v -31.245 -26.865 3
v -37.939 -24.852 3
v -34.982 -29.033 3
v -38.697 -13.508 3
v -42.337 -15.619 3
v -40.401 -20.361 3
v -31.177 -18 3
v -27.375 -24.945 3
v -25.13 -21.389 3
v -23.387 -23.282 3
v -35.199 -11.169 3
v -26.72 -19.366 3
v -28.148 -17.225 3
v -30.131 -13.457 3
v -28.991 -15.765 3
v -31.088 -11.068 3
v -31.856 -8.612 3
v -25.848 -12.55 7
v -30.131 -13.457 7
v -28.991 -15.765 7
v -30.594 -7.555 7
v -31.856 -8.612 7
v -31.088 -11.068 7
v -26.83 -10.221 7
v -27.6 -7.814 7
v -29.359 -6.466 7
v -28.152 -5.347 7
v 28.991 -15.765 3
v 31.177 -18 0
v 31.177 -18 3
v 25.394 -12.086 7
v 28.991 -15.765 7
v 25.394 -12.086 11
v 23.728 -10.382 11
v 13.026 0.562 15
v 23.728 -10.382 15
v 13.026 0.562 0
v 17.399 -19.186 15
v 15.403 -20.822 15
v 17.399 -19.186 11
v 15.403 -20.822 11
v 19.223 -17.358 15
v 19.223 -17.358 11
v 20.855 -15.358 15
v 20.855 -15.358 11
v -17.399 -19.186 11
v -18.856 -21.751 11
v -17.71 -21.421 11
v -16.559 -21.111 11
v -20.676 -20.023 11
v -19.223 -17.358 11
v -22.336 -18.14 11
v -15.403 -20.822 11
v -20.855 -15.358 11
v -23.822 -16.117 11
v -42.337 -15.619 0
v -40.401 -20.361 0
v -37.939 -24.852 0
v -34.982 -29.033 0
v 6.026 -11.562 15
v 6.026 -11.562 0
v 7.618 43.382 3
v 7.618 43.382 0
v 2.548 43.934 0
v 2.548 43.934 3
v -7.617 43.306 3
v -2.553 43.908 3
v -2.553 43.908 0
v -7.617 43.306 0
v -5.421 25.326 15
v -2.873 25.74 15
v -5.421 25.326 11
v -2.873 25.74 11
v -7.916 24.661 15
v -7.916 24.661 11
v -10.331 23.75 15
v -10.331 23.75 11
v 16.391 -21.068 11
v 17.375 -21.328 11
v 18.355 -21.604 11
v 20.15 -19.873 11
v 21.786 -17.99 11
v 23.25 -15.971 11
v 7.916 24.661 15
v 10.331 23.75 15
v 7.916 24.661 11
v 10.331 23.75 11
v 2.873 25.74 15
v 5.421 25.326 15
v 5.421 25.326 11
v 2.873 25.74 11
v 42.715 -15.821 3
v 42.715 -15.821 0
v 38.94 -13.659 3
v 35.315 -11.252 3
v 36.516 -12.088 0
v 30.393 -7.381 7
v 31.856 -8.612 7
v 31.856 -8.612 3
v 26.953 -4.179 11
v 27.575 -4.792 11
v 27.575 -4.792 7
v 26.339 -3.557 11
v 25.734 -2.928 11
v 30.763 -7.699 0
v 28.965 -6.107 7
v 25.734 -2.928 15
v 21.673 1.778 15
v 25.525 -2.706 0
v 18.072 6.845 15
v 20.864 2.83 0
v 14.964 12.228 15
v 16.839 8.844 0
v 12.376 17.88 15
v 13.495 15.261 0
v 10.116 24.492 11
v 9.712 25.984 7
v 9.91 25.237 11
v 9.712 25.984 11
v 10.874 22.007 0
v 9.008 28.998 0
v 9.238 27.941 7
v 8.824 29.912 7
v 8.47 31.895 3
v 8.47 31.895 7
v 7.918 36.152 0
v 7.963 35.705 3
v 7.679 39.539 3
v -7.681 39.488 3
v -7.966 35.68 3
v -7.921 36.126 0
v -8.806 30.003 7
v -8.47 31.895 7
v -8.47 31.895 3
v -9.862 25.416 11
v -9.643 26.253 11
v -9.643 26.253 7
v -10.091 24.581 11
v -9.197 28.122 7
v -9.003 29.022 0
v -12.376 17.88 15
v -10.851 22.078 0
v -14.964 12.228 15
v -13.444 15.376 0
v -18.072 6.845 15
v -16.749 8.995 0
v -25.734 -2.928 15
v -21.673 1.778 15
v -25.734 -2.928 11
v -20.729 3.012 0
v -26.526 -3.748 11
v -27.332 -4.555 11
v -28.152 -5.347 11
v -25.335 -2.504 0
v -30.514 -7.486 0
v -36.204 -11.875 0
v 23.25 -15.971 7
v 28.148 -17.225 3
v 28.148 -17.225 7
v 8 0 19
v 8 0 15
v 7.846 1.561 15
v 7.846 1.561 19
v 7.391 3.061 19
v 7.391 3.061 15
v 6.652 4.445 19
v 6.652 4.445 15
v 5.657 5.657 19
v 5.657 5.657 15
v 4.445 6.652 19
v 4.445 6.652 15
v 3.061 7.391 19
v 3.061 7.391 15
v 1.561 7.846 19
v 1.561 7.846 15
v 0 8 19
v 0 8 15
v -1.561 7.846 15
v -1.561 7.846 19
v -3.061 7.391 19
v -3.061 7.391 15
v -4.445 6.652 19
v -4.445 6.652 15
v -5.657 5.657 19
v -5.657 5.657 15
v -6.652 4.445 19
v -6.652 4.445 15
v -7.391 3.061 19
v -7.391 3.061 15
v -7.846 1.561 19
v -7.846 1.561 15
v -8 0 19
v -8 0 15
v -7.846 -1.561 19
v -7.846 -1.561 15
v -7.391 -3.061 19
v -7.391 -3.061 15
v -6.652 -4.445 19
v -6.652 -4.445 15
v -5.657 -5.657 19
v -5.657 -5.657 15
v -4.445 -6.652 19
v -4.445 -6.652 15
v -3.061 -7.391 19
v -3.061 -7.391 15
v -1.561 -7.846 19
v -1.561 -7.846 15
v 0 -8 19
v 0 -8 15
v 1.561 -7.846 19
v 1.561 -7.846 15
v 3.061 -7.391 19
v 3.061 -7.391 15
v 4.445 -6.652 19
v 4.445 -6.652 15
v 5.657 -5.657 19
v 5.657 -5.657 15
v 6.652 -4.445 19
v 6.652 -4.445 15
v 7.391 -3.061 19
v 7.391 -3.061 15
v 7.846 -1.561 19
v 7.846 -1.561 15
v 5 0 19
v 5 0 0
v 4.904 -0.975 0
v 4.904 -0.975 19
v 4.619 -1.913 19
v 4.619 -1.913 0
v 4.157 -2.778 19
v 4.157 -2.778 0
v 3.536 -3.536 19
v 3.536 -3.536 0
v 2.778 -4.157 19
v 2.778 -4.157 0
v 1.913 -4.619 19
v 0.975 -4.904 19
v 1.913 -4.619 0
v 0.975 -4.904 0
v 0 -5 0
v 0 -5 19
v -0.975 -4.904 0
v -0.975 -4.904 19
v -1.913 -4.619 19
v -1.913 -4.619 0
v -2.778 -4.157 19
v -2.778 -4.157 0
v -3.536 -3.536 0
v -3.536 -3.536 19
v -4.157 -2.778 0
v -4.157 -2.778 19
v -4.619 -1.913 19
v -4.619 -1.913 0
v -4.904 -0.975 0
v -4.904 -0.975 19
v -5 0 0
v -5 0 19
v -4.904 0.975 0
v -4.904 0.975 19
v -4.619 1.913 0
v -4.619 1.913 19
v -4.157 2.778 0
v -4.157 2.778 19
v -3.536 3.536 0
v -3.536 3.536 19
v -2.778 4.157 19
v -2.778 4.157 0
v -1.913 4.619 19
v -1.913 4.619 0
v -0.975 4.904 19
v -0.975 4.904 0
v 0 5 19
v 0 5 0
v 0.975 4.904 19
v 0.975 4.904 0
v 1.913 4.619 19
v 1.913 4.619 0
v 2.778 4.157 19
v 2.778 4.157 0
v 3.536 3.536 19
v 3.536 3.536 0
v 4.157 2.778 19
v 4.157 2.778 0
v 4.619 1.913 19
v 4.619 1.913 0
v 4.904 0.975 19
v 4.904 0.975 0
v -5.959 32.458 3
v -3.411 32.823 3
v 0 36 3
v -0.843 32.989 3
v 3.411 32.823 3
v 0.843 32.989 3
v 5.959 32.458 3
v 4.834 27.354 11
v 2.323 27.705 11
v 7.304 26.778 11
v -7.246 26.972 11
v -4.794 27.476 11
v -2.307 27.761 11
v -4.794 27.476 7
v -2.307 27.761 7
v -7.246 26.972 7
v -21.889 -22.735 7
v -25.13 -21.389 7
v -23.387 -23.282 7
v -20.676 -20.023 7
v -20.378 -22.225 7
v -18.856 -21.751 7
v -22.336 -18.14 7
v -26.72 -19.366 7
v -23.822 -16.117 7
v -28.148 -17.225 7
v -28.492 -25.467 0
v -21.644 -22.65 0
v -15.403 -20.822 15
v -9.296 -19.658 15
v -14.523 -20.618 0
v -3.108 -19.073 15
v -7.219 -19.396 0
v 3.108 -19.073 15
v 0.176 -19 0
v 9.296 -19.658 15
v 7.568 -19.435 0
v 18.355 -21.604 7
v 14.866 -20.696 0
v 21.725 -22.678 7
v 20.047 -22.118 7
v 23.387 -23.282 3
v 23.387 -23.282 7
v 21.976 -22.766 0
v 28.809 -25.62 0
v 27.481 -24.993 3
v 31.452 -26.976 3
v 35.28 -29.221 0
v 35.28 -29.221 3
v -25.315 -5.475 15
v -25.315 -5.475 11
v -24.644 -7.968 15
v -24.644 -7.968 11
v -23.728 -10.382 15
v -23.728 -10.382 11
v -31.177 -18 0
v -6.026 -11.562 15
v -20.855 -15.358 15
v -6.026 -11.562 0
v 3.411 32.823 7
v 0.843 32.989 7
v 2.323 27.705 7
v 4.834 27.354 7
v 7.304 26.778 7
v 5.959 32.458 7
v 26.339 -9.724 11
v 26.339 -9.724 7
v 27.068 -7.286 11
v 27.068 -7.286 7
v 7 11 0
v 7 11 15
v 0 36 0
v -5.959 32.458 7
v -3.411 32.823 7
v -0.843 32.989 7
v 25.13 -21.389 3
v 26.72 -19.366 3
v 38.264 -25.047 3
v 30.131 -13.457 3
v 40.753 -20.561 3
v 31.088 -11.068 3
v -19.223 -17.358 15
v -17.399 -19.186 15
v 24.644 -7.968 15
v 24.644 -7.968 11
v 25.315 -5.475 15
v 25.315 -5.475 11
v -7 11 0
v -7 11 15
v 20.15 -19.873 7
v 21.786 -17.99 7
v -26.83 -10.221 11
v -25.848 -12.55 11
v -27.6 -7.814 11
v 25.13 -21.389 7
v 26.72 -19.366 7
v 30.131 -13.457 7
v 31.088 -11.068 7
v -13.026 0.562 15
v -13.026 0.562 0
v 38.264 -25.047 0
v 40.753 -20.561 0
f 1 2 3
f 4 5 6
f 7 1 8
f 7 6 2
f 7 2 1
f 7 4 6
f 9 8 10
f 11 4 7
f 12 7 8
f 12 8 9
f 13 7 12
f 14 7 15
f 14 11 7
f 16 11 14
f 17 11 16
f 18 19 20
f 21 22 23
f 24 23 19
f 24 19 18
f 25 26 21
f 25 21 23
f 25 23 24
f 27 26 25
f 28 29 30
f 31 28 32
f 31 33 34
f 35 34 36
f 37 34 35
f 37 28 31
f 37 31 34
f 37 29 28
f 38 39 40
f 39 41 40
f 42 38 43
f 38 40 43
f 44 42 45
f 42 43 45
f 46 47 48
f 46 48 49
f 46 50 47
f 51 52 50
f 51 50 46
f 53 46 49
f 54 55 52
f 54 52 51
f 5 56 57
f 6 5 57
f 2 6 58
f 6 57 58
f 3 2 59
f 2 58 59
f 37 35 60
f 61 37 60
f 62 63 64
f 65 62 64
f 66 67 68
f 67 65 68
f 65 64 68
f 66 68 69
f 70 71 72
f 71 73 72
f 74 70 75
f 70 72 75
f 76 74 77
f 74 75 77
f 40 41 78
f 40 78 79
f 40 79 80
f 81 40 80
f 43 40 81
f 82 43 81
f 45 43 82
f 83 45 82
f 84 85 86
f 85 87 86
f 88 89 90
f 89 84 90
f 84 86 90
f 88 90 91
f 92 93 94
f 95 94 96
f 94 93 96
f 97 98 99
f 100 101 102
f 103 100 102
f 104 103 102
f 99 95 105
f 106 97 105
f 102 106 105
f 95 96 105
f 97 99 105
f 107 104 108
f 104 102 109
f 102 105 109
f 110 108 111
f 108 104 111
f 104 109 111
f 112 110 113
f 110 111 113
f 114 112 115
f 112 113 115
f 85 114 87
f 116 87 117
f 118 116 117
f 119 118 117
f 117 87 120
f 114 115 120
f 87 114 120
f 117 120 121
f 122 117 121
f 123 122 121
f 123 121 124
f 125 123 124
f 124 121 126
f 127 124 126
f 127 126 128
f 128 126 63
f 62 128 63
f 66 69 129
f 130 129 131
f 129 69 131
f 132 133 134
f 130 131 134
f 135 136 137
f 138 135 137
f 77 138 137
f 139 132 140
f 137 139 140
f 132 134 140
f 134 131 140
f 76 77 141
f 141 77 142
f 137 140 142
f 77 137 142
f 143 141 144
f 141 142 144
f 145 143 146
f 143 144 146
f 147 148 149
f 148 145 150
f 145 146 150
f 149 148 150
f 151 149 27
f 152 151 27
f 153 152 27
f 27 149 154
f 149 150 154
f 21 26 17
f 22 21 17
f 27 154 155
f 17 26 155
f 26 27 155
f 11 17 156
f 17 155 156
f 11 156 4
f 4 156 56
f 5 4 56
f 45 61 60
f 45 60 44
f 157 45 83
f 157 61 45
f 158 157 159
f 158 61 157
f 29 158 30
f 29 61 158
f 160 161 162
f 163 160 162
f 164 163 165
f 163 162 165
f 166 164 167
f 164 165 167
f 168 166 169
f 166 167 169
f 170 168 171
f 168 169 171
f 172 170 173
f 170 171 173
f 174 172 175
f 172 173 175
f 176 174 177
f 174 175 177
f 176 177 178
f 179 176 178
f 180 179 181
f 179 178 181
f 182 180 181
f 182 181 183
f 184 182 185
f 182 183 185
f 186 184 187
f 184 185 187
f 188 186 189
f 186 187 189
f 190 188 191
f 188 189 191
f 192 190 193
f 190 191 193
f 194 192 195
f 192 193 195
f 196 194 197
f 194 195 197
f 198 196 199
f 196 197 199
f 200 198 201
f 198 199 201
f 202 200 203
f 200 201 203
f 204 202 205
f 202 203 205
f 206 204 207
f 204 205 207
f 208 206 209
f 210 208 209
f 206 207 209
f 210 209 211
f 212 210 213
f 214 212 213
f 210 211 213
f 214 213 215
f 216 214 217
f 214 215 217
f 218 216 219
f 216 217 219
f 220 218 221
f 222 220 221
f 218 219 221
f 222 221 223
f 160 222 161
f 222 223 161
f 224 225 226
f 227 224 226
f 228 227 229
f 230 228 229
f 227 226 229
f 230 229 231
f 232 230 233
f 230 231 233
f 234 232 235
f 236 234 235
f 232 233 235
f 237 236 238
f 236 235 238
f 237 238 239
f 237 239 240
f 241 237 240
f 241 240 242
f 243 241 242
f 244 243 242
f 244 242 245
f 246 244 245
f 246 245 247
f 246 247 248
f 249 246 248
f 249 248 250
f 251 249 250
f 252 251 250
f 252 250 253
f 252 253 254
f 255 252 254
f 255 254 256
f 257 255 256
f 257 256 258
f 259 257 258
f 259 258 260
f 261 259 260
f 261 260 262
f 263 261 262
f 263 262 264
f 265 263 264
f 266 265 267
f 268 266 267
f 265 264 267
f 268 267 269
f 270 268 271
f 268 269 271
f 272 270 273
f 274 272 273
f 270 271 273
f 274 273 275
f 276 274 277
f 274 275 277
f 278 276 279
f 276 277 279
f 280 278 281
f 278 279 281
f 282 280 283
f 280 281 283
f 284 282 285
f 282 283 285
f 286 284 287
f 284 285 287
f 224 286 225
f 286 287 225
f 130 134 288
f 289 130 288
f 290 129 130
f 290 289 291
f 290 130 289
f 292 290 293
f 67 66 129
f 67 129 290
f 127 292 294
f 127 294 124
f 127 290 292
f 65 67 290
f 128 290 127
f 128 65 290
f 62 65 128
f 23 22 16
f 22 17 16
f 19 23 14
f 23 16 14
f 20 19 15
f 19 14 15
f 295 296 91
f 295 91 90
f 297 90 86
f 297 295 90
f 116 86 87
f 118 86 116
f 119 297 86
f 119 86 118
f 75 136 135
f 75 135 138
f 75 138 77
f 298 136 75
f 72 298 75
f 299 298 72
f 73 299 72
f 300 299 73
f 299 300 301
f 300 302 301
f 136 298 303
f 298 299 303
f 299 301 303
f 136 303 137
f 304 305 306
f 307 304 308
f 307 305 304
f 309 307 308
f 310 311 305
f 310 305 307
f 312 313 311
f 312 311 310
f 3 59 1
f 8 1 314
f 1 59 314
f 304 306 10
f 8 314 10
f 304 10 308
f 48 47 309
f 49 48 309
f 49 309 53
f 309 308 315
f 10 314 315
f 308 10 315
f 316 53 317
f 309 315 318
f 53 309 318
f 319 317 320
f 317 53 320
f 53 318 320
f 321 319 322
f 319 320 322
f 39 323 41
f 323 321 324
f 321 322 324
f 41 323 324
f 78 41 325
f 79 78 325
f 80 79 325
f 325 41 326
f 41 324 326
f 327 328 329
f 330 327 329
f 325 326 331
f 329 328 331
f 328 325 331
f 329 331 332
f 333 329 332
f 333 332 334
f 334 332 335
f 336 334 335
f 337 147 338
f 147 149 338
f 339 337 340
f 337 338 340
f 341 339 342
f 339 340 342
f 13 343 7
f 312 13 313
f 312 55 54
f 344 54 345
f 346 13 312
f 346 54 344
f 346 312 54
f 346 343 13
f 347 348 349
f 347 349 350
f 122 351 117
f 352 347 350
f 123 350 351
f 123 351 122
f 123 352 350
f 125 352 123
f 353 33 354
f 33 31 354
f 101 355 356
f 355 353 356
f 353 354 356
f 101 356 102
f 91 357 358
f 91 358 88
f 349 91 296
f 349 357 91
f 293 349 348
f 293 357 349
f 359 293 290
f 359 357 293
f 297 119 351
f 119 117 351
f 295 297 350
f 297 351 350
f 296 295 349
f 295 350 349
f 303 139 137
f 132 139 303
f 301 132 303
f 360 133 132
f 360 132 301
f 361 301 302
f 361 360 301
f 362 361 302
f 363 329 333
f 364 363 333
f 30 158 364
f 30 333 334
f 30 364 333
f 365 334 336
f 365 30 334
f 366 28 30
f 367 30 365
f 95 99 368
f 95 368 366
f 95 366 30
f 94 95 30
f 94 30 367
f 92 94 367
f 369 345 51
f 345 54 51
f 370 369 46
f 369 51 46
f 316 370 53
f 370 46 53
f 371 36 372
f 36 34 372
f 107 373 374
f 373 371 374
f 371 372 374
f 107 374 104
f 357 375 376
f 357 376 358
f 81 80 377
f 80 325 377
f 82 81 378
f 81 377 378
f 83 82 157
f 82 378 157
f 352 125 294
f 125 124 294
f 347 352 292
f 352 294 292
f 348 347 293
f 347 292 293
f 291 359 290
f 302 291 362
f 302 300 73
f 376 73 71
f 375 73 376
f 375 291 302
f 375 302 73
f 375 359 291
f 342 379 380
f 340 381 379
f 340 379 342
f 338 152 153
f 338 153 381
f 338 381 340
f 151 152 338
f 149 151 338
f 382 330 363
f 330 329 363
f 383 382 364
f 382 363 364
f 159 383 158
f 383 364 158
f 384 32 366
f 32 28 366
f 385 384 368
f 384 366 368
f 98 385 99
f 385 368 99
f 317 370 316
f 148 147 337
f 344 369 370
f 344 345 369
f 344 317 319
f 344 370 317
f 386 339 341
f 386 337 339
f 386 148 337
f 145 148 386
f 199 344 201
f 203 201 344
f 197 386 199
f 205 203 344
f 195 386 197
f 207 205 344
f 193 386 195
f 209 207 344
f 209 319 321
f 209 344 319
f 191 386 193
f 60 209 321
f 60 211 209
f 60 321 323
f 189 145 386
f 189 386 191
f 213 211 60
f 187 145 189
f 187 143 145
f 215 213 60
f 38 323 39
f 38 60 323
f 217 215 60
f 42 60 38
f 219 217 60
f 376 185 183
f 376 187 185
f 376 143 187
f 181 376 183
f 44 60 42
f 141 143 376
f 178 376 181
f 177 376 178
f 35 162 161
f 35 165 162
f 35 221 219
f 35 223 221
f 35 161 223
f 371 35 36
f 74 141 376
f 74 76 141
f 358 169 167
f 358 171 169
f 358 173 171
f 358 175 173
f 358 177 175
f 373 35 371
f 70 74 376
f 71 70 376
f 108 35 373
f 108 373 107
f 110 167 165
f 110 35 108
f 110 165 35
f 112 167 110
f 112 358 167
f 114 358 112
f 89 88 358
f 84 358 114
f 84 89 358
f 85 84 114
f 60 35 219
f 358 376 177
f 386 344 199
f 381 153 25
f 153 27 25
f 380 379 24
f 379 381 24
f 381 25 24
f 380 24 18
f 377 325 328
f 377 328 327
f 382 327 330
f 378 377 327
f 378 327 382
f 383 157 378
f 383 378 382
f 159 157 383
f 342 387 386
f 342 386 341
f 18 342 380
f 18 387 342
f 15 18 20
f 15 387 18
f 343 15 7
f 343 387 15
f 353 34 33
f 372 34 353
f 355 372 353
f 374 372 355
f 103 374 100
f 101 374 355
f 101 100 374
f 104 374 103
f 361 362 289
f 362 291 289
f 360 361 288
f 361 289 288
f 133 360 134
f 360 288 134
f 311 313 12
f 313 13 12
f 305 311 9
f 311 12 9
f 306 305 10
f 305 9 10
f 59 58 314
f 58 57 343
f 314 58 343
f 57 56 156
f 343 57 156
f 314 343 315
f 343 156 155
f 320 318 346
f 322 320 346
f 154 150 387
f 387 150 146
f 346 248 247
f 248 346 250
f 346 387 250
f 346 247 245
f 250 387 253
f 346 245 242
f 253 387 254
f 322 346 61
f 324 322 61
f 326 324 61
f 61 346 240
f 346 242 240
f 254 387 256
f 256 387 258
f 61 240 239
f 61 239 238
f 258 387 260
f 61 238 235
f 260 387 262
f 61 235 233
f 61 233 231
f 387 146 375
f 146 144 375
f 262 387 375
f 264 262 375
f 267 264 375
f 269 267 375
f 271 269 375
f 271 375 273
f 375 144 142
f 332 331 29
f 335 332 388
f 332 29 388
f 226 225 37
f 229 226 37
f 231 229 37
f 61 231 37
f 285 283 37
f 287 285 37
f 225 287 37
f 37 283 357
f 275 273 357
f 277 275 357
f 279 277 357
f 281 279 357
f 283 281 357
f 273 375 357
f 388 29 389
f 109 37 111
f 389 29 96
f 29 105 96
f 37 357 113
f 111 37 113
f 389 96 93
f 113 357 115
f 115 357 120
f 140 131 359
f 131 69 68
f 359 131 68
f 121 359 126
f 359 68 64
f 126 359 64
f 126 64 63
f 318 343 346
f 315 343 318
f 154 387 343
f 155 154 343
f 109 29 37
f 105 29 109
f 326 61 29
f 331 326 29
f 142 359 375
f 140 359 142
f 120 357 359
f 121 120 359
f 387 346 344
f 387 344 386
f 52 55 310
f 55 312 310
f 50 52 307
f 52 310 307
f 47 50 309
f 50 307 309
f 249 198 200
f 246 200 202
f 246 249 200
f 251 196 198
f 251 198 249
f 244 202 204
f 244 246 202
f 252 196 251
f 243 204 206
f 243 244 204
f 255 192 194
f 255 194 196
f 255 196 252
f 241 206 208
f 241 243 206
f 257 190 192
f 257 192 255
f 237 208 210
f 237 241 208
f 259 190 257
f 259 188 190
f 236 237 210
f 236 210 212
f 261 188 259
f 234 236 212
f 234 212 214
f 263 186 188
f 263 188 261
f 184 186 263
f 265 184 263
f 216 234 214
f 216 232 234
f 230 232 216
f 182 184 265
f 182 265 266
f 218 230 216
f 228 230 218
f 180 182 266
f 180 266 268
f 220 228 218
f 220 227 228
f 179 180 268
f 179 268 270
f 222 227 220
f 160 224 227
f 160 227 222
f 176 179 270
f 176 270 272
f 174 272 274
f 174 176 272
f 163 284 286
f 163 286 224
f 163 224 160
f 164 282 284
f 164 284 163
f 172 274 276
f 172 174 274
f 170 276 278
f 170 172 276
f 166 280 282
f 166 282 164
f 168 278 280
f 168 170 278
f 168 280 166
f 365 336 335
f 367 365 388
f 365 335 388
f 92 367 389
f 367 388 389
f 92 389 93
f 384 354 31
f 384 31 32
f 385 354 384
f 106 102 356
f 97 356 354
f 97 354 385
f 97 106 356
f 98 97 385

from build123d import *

# Parameters (mm, degrees)
SKETCH_R              = 45
PAD_DEPTH             = 3
SKETCH001_R           = 33
PAD001_DEPTH          = 4
SKETCH002_R           = 28.25
PAD002_DEPTH          = 4
SKETCH003_R           = 25.9
PAD003_DEPTH          = 4
SKETCH004_R           = 8
PAD004_DEPTH          = 4
SKETCH005_R           = 5
POCKET_DEPTH          = 19.001
SKETCH006_R           = 66
POCKET001_DEPTH       = 276.380098
POLARPATTERN_COUNT    = 3
POCKET002_DEPTH       = 246.643698
POLARPATTERN001_COUNT = 3


with BuildPart() as part:
    # Sketch → Pad (new body)
    with BuildSketch(Plane.XY):
        with Locations((0.22389, -1.005935)):
            Circle(SKETCH_R)
    extrude(amount=PAD_DEPTH)

    # Sketch001 (on Face3 of Pad) → Pad001 (join)
    with BuildSketch(Plane.XY.offset(3)):
        Circle(SKETCH001_R)
    extrude(amount=PAD001_DEPTH)

    # Sketch002 (on Face5 of Pad001) → Pad002 (join)
    with BuildSketch(Plane.XY.offset(7)):
        with Locations((-0.334541, -0.419601)):
            Circle(SKETCH002_R)
    extrude(amount=PAD002_DEPTH)

    # Sketch003 (on Face7 of Pad002) → Pad003 (join)
    with BuildSketch(Plane.XY.offset(11)):
        Circle(SKETCH003_R)
    extrude(amount=PAD003_DEPTH)

    # Sketch004 (on Face9 of Pad003) → Pad004 (join)
    with BuildSketch(Plane.XY.offset(15)):
        Circle(SKETCH004_R)
    extrude(amount=PAD004_DEPTH)

    # Sketch005 (on Face2 of Pad004) → Pocket (cut, through all)
    with BuildSketch(Plane(origin=(0, 0, 0), x_dir=(1, 0, 0), z_dir=(0, 0, -1))):
        Circle(SKETCH005_R)
    extrude(amount=-POCKET_DEPTH, mode=Mode.SUBTRACT)

    # Sketch006 (on Face2 of Pocket) → Pocket001 (cut, through all)
    with BuildSketch(Plane(origin=(0, 0, 0), x_dir=(1, 0, 0), z_dir=(0, 0, -1))):
        with Locations((0, 85)):
            Circle(SKETCH006_R)
    pocket001 = extrude(amount=-POCKET001_DEPTH, mode=Mode.SUBTRACT)

    # PolarPattern: Pocket001 ×3 about axis
    polarpattern_axis = Axis((0, 0, 0), (0, 0, -1))
    for i in range(1, POLARPATTERN_COUNT):
        add(pocket001.rotate(polarpattern_axis, i * 360 / POLARPATTERN_COUNT), mode=Mode.SUBTRACT)

    # Sketch007 (on Face2 of PolarPattern) → Pocket002 (cut, through all)
    with BuildSketch(Plane(origin=(0, 0, 0), x_dir=(1, 0, 0), z_dir=(0, 0, -1))):
        Polygon((-7, -11), (7, -11), (0, -36), align=None)
    pocket002 = extrude(amount=-POCKET002_DEPTH, mode=Mode.SUBTRACT)

    # PolarPattern001: Pocket002 ×3 about axis
    polarpattern001_axis = Axis((0, 0, 0), (0, 0, -1))
    for i in range(1, POLARPATTERN001_COUNT):
        add(pocket002.rotate(polarpattern001_axis, i * 360 / POLARPATTERN001_COUNT), mode=Mode.SUBTRACT)


solid = part.part
